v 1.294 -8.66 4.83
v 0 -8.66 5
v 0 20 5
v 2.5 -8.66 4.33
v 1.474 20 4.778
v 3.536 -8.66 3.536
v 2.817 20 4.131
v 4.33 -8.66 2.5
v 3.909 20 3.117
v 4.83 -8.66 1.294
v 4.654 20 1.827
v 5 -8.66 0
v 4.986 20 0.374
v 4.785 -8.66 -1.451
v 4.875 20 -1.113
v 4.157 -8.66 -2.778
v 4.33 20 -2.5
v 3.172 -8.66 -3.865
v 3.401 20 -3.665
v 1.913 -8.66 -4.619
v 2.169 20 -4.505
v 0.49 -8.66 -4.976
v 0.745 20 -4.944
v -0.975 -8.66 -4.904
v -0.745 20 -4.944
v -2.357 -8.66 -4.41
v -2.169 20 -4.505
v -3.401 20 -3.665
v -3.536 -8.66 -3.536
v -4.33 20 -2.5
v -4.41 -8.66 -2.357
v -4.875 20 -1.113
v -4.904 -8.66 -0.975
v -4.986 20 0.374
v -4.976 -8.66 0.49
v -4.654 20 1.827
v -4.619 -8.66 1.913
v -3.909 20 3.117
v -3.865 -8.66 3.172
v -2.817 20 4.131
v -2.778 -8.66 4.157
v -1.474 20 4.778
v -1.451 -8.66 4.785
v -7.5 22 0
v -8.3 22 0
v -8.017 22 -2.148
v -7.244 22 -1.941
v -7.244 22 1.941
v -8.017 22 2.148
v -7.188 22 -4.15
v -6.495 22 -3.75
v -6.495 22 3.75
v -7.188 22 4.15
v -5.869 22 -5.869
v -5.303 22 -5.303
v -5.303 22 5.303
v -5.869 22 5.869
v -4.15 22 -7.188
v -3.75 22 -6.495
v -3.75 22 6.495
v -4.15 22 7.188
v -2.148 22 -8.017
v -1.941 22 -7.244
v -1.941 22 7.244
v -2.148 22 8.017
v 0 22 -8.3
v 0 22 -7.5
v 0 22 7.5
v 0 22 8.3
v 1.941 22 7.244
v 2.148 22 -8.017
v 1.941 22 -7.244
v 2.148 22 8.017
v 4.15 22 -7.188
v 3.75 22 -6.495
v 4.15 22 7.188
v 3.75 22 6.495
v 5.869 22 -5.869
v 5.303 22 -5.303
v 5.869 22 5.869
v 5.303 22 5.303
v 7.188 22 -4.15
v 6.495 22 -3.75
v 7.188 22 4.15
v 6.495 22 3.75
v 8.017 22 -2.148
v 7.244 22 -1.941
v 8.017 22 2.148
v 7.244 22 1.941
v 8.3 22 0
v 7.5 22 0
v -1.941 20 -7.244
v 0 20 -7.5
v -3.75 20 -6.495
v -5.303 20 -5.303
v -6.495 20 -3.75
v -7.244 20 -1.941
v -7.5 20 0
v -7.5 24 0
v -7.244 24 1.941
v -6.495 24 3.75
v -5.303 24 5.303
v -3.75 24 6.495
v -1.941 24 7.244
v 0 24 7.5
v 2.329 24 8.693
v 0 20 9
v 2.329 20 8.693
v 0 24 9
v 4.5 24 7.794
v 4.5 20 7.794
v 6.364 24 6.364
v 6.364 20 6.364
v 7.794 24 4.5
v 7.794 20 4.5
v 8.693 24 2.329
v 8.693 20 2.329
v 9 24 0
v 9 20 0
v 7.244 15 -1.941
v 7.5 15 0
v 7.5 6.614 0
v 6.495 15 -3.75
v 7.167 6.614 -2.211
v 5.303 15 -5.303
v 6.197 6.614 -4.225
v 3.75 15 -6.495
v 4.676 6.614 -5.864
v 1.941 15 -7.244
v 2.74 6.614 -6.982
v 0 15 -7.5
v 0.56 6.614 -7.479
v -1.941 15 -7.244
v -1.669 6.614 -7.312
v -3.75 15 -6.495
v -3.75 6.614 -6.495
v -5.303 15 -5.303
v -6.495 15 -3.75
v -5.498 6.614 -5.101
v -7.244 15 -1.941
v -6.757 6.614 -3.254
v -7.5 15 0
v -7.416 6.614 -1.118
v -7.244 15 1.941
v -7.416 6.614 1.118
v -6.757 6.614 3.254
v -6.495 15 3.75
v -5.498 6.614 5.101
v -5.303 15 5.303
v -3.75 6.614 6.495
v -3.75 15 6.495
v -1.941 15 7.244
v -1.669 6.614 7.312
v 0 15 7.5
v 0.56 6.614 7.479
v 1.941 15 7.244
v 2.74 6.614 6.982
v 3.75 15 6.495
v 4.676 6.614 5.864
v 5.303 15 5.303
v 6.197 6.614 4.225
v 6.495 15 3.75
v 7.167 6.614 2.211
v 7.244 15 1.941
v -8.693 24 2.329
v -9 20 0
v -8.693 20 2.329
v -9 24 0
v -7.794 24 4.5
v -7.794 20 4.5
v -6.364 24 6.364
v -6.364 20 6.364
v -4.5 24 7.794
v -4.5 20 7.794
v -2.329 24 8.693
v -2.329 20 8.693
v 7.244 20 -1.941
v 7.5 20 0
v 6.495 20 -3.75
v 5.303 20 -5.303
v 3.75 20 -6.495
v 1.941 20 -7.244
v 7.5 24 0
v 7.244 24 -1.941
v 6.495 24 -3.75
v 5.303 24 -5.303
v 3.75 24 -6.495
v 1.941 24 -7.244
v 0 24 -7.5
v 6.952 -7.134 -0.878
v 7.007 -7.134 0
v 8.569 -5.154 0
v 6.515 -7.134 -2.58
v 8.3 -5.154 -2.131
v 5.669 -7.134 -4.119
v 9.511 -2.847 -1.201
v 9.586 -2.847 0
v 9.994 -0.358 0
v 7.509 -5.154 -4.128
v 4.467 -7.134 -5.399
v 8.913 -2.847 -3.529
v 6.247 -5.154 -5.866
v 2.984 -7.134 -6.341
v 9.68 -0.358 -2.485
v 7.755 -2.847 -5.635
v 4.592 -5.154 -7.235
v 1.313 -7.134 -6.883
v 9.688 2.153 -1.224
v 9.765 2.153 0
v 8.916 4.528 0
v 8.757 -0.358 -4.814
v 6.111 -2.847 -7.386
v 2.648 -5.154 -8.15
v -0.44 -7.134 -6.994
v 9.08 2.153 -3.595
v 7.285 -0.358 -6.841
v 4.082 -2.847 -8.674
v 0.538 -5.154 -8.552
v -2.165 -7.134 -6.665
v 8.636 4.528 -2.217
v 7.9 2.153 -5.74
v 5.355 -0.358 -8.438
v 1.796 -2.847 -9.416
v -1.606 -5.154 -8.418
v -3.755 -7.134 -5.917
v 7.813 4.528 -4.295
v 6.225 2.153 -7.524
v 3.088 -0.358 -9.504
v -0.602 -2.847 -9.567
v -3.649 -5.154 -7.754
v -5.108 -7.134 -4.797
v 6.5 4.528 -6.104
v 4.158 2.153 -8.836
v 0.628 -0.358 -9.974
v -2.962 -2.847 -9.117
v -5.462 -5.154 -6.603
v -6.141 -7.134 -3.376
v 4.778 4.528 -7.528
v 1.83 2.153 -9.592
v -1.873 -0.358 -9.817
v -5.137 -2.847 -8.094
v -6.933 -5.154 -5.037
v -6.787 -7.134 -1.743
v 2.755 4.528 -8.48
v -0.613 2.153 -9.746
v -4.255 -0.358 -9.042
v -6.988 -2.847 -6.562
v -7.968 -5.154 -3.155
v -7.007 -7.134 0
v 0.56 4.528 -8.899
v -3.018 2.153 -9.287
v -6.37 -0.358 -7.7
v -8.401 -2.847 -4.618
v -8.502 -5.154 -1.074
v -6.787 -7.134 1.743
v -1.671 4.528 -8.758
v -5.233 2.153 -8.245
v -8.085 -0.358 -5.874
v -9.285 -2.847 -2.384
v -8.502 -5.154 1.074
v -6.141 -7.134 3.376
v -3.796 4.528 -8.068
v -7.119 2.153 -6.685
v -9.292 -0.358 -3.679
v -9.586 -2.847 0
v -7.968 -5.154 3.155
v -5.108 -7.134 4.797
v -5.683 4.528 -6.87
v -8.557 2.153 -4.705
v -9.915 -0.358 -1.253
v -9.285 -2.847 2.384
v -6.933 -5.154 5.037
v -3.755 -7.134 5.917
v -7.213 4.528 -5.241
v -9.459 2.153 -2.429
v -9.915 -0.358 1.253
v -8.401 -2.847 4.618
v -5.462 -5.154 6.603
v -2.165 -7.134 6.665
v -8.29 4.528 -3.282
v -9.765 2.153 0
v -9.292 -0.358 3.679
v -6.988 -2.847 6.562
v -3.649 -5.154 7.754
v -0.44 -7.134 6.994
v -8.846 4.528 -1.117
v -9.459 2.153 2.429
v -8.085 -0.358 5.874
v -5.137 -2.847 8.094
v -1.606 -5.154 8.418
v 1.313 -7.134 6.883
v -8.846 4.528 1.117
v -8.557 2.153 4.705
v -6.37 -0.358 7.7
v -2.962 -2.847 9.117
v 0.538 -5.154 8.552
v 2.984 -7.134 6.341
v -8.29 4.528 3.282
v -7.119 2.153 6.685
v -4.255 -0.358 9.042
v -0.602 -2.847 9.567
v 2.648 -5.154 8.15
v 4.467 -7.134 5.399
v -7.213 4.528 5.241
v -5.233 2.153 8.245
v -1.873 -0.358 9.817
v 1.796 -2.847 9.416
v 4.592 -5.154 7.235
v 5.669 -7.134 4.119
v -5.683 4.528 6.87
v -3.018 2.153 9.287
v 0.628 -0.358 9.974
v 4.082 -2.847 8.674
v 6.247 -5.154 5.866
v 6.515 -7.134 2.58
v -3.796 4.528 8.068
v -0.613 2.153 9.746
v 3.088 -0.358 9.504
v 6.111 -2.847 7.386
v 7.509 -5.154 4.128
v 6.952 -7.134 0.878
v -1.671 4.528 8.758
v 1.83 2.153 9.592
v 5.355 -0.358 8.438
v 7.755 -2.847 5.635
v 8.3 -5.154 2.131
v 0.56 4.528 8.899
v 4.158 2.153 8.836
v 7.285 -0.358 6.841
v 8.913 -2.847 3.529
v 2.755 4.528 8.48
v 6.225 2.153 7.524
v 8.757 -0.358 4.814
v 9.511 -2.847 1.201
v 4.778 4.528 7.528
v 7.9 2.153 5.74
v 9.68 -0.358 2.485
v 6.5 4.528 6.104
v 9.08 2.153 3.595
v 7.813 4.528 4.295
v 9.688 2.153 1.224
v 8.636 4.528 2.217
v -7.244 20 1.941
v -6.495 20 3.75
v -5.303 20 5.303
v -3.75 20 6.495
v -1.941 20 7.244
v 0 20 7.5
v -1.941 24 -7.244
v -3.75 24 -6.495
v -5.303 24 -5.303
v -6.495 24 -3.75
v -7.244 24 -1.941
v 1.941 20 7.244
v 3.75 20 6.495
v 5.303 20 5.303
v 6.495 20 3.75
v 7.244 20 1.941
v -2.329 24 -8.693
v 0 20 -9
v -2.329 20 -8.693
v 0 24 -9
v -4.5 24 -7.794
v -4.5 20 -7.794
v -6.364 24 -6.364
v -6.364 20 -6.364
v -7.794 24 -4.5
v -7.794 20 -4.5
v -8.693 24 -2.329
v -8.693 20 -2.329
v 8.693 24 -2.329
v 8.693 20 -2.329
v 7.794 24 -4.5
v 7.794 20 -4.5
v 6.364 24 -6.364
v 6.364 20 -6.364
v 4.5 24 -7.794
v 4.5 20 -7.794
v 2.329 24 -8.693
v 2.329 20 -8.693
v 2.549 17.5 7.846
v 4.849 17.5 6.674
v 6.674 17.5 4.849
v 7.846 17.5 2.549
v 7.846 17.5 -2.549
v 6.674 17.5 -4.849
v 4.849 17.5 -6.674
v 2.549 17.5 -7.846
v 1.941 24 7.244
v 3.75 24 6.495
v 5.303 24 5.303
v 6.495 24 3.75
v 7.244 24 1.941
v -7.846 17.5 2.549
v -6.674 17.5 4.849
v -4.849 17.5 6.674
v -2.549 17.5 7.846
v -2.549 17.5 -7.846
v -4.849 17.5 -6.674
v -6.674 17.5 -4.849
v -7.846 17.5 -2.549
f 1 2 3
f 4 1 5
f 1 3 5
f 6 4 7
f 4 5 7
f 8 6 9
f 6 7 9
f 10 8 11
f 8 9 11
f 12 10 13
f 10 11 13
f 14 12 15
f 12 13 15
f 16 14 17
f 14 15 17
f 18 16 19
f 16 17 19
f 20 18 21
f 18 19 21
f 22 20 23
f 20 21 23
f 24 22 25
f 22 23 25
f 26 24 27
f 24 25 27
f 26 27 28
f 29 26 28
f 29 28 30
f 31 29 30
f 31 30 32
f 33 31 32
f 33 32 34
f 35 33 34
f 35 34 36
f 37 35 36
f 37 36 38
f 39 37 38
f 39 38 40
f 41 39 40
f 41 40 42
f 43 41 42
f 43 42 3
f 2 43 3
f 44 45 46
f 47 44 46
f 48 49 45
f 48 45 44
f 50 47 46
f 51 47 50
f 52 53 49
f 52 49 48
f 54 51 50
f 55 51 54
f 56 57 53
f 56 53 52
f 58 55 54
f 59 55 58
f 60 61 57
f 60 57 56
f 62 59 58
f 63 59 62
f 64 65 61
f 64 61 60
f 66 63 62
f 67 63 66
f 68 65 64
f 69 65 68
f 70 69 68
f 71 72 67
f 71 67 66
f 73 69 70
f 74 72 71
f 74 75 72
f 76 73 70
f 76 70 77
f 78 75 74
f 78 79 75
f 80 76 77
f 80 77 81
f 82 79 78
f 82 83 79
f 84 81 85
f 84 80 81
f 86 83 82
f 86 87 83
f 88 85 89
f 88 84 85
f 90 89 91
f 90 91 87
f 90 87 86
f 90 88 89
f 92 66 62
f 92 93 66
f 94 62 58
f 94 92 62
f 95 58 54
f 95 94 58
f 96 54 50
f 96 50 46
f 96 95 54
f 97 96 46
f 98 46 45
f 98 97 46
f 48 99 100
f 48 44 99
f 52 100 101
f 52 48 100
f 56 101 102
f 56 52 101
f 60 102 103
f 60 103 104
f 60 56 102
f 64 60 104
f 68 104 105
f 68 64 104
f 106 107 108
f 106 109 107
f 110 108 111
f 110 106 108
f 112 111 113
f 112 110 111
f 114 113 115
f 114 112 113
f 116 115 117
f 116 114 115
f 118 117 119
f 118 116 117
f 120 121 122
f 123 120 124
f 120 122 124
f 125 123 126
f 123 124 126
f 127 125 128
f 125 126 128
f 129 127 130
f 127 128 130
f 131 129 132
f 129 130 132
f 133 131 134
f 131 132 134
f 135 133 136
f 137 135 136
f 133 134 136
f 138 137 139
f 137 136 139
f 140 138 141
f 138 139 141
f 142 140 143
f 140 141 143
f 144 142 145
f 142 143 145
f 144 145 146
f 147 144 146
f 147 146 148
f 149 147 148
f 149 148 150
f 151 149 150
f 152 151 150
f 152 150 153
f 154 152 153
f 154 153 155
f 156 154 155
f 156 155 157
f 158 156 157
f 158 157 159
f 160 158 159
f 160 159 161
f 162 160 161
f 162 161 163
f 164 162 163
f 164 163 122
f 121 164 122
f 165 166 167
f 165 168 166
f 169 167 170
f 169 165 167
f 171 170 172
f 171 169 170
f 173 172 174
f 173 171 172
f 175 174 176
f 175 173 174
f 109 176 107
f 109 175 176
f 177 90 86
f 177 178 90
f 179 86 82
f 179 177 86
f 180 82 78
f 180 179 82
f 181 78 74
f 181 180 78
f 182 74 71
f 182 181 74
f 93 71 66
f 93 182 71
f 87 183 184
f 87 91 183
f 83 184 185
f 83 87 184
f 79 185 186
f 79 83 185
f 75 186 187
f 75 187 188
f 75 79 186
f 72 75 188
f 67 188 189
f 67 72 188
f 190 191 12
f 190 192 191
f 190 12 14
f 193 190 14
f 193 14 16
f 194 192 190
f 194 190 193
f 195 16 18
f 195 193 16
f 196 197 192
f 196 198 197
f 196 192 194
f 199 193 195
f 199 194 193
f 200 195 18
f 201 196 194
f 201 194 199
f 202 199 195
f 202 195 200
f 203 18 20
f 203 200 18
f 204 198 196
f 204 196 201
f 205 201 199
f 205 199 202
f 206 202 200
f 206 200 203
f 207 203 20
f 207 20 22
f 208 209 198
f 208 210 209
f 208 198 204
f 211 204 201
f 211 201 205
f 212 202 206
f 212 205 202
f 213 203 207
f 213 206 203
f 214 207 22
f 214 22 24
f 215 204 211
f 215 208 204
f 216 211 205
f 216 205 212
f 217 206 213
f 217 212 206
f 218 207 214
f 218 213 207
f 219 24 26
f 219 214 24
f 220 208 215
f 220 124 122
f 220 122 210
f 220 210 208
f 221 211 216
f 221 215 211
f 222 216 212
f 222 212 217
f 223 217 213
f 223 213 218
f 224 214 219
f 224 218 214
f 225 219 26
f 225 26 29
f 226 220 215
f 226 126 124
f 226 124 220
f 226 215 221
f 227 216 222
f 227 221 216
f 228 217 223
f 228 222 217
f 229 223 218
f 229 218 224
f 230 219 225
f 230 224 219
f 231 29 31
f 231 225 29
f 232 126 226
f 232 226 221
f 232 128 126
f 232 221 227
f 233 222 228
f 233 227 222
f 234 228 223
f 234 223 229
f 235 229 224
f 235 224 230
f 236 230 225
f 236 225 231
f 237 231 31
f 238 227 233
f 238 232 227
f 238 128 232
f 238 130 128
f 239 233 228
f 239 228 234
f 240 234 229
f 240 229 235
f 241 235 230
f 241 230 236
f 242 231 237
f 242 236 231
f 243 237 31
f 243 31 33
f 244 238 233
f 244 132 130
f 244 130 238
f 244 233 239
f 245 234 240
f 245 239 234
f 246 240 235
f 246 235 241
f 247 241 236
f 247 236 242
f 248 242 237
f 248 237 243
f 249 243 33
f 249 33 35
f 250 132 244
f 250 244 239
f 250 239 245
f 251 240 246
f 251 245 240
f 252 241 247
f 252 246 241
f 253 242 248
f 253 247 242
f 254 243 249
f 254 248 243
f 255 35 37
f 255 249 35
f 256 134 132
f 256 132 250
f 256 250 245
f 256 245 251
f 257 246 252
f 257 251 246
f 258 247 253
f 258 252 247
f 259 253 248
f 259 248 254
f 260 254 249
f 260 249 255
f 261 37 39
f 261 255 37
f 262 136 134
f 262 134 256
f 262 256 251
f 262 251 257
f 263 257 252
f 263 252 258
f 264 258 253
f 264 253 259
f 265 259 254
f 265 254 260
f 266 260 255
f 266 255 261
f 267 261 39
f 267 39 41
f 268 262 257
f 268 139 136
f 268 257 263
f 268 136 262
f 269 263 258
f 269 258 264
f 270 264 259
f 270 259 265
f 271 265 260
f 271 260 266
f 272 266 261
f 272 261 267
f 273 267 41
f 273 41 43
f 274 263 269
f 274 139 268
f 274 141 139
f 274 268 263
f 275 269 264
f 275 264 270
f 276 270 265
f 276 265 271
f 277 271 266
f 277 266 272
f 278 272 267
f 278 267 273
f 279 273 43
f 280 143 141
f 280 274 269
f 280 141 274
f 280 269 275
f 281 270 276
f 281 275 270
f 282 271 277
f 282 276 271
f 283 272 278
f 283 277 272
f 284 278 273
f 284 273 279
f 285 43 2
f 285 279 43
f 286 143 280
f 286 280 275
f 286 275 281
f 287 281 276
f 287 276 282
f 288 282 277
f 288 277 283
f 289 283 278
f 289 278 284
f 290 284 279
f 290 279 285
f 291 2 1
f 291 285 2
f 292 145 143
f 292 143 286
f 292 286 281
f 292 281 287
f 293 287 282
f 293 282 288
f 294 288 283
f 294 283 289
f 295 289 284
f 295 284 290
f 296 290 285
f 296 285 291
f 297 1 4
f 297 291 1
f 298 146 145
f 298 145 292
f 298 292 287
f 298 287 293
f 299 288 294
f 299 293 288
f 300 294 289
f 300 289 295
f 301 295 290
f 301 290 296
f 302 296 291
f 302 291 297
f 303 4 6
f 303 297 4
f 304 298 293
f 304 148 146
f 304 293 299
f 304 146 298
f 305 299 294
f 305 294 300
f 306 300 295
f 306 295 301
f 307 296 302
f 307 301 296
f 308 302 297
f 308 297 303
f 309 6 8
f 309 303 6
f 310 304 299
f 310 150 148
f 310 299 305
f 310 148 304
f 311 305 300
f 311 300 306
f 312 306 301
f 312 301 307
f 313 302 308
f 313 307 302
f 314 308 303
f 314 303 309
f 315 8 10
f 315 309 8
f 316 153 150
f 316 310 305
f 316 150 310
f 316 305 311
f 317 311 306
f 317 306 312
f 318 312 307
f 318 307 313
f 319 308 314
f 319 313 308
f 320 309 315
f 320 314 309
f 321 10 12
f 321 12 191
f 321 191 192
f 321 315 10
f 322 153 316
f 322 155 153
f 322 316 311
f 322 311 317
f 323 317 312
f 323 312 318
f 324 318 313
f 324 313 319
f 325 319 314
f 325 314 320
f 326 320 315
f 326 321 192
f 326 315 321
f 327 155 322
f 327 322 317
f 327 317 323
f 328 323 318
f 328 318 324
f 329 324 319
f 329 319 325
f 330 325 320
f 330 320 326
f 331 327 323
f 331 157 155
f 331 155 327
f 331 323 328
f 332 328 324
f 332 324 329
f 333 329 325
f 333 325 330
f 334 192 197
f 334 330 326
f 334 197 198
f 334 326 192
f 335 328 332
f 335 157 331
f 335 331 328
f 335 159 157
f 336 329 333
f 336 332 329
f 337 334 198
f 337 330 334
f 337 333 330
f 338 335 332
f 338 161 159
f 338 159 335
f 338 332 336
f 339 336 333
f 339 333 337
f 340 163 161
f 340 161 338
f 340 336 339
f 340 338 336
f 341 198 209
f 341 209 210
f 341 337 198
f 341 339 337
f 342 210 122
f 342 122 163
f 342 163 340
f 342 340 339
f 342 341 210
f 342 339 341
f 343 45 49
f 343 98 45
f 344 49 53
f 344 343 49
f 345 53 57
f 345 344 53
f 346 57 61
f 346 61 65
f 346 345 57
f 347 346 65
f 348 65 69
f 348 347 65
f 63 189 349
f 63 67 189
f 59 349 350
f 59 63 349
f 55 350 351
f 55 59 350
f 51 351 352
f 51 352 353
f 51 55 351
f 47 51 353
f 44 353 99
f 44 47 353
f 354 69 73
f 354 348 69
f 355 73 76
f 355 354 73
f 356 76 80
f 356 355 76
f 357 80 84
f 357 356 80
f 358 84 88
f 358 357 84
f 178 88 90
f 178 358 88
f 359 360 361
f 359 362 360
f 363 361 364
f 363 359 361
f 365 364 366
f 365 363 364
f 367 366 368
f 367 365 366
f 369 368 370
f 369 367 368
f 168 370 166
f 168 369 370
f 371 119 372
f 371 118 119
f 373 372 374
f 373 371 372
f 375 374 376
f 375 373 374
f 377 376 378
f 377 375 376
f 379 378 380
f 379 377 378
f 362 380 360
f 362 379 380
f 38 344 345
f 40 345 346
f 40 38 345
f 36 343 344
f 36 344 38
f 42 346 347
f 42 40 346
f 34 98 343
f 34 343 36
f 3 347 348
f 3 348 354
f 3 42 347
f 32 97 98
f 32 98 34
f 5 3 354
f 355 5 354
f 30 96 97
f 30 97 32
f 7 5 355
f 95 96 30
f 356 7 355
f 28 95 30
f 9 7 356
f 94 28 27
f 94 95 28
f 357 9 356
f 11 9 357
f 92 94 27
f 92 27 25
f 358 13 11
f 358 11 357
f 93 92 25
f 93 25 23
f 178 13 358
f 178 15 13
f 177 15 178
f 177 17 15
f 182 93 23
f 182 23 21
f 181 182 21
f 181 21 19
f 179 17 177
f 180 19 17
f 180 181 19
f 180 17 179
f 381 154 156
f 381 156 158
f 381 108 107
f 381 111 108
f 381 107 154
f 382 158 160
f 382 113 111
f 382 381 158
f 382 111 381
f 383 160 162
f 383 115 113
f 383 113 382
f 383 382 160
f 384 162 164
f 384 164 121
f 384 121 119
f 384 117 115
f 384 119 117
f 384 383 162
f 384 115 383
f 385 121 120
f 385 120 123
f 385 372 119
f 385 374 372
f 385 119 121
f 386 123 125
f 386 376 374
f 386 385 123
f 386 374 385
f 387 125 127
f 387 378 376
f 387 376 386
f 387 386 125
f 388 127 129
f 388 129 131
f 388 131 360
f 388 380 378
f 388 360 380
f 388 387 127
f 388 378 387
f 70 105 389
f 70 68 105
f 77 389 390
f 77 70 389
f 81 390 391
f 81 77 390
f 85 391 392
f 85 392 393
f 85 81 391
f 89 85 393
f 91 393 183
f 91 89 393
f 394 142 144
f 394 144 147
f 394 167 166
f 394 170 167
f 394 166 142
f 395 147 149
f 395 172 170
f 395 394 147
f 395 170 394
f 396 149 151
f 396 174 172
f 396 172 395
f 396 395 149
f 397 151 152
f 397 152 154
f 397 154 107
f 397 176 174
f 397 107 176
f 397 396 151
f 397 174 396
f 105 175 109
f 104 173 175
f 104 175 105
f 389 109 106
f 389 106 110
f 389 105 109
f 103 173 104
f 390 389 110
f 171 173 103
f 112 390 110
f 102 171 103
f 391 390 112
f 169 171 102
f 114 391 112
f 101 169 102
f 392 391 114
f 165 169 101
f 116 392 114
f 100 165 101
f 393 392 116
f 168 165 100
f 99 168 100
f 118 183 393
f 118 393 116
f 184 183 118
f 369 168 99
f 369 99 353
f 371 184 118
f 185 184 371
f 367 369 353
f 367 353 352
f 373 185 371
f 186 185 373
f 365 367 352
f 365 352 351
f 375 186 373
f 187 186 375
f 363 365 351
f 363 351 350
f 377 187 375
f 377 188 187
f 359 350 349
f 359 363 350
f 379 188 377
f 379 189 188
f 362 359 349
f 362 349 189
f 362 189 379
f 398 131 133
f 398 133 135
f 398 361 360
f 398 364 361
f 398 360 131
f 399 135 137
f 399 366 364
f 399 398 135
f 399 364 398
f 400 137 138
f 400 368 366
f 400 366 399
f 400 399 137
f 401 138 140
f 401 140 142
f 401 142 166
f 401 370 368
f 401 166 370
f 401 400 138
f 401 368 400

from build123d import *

# Parameters (mm, degrees)
SKETCH_3_R          = 7.5
EXTRUDE_1_DEPTH     = 20
SKETCH_5_R          = 5
CUT_EXTRUDE_1_DEPTH = 34.166247904


with BuildPart() as part:
    # 扫描1: sweep along a path in 草图2
    with BuildLine(Plane(origin=(0, 0, 0), x_dir=(1, 0, 0), z_dir=(0, 1, 0))) as sweep_1_path:
        CenterArc((0, 0), 10, 0, 360)
    # 草图1 → 扫描1 (sweep)
    with BuildSketch(Plane.XY):
        with BuildLine():
            Line((0, 10), (0, -10))
            ThreePointArc((0, -10), (10, 0), (0, 10))
        make_face()
    sweep(path=sweep_1_path.line)

    # 草图3 → 凸台-拉伸1 (add)
    with BuildSketch(Plane(origin=(0, 0, 0), x_dir=(1, 0, 0), z_dir=(0, 1, 0))):
        Circle(SKETCH_3_R)
    extrude(amount=EXTRUDE_1_DEPTH)

    # 扫描2: sweep along a curve in space
    with BuildLine() as sweep_2_path:
        ThreePointArc((0, 20, 7.5), (5.303300859, 20, 5.303300859), (7.5, 20, 0))
        ThreePointArc((7.5, 20, 0), (5.303300859, 20, -5.303300859), (0, 20, -7.5))
        ThreePointArc((0, 20, -7.5), (-5.303300859, 20, -5.303300859), (-7.5, 20, 0))
        ThreePointArc((-7.5, 20, 0), (-5.303300859, 20, 5.303300859), (0, 20, 7.5))
    # 草图4 → 扫描2 (sweep)
    with BuildSketch(Plane.XY):
        Polygon((7.5, 22), (8.3, 22), (7.5, 20), (7.5, 15), (9, 20), (9, 24), (7.5, 24), align=None)
    sweep(path=sweep_2_path.line)

    # 草图5 → 切除-拉伸1 (cut, through all)
    with BuildSketch(Plane(origin=(0, 20, 0), x_dir=(1, 0, 0), z_dir=(0, 1, 0))):
        with Locations(Location((0, 0, 0), (0, 0, 270))):
            Circle(SKETCH_5_R)
    extrude(amount=-CUT_EXTRUDE_1_DEPTH, mode=Mode.SUBTRACT)


solid = part.part
